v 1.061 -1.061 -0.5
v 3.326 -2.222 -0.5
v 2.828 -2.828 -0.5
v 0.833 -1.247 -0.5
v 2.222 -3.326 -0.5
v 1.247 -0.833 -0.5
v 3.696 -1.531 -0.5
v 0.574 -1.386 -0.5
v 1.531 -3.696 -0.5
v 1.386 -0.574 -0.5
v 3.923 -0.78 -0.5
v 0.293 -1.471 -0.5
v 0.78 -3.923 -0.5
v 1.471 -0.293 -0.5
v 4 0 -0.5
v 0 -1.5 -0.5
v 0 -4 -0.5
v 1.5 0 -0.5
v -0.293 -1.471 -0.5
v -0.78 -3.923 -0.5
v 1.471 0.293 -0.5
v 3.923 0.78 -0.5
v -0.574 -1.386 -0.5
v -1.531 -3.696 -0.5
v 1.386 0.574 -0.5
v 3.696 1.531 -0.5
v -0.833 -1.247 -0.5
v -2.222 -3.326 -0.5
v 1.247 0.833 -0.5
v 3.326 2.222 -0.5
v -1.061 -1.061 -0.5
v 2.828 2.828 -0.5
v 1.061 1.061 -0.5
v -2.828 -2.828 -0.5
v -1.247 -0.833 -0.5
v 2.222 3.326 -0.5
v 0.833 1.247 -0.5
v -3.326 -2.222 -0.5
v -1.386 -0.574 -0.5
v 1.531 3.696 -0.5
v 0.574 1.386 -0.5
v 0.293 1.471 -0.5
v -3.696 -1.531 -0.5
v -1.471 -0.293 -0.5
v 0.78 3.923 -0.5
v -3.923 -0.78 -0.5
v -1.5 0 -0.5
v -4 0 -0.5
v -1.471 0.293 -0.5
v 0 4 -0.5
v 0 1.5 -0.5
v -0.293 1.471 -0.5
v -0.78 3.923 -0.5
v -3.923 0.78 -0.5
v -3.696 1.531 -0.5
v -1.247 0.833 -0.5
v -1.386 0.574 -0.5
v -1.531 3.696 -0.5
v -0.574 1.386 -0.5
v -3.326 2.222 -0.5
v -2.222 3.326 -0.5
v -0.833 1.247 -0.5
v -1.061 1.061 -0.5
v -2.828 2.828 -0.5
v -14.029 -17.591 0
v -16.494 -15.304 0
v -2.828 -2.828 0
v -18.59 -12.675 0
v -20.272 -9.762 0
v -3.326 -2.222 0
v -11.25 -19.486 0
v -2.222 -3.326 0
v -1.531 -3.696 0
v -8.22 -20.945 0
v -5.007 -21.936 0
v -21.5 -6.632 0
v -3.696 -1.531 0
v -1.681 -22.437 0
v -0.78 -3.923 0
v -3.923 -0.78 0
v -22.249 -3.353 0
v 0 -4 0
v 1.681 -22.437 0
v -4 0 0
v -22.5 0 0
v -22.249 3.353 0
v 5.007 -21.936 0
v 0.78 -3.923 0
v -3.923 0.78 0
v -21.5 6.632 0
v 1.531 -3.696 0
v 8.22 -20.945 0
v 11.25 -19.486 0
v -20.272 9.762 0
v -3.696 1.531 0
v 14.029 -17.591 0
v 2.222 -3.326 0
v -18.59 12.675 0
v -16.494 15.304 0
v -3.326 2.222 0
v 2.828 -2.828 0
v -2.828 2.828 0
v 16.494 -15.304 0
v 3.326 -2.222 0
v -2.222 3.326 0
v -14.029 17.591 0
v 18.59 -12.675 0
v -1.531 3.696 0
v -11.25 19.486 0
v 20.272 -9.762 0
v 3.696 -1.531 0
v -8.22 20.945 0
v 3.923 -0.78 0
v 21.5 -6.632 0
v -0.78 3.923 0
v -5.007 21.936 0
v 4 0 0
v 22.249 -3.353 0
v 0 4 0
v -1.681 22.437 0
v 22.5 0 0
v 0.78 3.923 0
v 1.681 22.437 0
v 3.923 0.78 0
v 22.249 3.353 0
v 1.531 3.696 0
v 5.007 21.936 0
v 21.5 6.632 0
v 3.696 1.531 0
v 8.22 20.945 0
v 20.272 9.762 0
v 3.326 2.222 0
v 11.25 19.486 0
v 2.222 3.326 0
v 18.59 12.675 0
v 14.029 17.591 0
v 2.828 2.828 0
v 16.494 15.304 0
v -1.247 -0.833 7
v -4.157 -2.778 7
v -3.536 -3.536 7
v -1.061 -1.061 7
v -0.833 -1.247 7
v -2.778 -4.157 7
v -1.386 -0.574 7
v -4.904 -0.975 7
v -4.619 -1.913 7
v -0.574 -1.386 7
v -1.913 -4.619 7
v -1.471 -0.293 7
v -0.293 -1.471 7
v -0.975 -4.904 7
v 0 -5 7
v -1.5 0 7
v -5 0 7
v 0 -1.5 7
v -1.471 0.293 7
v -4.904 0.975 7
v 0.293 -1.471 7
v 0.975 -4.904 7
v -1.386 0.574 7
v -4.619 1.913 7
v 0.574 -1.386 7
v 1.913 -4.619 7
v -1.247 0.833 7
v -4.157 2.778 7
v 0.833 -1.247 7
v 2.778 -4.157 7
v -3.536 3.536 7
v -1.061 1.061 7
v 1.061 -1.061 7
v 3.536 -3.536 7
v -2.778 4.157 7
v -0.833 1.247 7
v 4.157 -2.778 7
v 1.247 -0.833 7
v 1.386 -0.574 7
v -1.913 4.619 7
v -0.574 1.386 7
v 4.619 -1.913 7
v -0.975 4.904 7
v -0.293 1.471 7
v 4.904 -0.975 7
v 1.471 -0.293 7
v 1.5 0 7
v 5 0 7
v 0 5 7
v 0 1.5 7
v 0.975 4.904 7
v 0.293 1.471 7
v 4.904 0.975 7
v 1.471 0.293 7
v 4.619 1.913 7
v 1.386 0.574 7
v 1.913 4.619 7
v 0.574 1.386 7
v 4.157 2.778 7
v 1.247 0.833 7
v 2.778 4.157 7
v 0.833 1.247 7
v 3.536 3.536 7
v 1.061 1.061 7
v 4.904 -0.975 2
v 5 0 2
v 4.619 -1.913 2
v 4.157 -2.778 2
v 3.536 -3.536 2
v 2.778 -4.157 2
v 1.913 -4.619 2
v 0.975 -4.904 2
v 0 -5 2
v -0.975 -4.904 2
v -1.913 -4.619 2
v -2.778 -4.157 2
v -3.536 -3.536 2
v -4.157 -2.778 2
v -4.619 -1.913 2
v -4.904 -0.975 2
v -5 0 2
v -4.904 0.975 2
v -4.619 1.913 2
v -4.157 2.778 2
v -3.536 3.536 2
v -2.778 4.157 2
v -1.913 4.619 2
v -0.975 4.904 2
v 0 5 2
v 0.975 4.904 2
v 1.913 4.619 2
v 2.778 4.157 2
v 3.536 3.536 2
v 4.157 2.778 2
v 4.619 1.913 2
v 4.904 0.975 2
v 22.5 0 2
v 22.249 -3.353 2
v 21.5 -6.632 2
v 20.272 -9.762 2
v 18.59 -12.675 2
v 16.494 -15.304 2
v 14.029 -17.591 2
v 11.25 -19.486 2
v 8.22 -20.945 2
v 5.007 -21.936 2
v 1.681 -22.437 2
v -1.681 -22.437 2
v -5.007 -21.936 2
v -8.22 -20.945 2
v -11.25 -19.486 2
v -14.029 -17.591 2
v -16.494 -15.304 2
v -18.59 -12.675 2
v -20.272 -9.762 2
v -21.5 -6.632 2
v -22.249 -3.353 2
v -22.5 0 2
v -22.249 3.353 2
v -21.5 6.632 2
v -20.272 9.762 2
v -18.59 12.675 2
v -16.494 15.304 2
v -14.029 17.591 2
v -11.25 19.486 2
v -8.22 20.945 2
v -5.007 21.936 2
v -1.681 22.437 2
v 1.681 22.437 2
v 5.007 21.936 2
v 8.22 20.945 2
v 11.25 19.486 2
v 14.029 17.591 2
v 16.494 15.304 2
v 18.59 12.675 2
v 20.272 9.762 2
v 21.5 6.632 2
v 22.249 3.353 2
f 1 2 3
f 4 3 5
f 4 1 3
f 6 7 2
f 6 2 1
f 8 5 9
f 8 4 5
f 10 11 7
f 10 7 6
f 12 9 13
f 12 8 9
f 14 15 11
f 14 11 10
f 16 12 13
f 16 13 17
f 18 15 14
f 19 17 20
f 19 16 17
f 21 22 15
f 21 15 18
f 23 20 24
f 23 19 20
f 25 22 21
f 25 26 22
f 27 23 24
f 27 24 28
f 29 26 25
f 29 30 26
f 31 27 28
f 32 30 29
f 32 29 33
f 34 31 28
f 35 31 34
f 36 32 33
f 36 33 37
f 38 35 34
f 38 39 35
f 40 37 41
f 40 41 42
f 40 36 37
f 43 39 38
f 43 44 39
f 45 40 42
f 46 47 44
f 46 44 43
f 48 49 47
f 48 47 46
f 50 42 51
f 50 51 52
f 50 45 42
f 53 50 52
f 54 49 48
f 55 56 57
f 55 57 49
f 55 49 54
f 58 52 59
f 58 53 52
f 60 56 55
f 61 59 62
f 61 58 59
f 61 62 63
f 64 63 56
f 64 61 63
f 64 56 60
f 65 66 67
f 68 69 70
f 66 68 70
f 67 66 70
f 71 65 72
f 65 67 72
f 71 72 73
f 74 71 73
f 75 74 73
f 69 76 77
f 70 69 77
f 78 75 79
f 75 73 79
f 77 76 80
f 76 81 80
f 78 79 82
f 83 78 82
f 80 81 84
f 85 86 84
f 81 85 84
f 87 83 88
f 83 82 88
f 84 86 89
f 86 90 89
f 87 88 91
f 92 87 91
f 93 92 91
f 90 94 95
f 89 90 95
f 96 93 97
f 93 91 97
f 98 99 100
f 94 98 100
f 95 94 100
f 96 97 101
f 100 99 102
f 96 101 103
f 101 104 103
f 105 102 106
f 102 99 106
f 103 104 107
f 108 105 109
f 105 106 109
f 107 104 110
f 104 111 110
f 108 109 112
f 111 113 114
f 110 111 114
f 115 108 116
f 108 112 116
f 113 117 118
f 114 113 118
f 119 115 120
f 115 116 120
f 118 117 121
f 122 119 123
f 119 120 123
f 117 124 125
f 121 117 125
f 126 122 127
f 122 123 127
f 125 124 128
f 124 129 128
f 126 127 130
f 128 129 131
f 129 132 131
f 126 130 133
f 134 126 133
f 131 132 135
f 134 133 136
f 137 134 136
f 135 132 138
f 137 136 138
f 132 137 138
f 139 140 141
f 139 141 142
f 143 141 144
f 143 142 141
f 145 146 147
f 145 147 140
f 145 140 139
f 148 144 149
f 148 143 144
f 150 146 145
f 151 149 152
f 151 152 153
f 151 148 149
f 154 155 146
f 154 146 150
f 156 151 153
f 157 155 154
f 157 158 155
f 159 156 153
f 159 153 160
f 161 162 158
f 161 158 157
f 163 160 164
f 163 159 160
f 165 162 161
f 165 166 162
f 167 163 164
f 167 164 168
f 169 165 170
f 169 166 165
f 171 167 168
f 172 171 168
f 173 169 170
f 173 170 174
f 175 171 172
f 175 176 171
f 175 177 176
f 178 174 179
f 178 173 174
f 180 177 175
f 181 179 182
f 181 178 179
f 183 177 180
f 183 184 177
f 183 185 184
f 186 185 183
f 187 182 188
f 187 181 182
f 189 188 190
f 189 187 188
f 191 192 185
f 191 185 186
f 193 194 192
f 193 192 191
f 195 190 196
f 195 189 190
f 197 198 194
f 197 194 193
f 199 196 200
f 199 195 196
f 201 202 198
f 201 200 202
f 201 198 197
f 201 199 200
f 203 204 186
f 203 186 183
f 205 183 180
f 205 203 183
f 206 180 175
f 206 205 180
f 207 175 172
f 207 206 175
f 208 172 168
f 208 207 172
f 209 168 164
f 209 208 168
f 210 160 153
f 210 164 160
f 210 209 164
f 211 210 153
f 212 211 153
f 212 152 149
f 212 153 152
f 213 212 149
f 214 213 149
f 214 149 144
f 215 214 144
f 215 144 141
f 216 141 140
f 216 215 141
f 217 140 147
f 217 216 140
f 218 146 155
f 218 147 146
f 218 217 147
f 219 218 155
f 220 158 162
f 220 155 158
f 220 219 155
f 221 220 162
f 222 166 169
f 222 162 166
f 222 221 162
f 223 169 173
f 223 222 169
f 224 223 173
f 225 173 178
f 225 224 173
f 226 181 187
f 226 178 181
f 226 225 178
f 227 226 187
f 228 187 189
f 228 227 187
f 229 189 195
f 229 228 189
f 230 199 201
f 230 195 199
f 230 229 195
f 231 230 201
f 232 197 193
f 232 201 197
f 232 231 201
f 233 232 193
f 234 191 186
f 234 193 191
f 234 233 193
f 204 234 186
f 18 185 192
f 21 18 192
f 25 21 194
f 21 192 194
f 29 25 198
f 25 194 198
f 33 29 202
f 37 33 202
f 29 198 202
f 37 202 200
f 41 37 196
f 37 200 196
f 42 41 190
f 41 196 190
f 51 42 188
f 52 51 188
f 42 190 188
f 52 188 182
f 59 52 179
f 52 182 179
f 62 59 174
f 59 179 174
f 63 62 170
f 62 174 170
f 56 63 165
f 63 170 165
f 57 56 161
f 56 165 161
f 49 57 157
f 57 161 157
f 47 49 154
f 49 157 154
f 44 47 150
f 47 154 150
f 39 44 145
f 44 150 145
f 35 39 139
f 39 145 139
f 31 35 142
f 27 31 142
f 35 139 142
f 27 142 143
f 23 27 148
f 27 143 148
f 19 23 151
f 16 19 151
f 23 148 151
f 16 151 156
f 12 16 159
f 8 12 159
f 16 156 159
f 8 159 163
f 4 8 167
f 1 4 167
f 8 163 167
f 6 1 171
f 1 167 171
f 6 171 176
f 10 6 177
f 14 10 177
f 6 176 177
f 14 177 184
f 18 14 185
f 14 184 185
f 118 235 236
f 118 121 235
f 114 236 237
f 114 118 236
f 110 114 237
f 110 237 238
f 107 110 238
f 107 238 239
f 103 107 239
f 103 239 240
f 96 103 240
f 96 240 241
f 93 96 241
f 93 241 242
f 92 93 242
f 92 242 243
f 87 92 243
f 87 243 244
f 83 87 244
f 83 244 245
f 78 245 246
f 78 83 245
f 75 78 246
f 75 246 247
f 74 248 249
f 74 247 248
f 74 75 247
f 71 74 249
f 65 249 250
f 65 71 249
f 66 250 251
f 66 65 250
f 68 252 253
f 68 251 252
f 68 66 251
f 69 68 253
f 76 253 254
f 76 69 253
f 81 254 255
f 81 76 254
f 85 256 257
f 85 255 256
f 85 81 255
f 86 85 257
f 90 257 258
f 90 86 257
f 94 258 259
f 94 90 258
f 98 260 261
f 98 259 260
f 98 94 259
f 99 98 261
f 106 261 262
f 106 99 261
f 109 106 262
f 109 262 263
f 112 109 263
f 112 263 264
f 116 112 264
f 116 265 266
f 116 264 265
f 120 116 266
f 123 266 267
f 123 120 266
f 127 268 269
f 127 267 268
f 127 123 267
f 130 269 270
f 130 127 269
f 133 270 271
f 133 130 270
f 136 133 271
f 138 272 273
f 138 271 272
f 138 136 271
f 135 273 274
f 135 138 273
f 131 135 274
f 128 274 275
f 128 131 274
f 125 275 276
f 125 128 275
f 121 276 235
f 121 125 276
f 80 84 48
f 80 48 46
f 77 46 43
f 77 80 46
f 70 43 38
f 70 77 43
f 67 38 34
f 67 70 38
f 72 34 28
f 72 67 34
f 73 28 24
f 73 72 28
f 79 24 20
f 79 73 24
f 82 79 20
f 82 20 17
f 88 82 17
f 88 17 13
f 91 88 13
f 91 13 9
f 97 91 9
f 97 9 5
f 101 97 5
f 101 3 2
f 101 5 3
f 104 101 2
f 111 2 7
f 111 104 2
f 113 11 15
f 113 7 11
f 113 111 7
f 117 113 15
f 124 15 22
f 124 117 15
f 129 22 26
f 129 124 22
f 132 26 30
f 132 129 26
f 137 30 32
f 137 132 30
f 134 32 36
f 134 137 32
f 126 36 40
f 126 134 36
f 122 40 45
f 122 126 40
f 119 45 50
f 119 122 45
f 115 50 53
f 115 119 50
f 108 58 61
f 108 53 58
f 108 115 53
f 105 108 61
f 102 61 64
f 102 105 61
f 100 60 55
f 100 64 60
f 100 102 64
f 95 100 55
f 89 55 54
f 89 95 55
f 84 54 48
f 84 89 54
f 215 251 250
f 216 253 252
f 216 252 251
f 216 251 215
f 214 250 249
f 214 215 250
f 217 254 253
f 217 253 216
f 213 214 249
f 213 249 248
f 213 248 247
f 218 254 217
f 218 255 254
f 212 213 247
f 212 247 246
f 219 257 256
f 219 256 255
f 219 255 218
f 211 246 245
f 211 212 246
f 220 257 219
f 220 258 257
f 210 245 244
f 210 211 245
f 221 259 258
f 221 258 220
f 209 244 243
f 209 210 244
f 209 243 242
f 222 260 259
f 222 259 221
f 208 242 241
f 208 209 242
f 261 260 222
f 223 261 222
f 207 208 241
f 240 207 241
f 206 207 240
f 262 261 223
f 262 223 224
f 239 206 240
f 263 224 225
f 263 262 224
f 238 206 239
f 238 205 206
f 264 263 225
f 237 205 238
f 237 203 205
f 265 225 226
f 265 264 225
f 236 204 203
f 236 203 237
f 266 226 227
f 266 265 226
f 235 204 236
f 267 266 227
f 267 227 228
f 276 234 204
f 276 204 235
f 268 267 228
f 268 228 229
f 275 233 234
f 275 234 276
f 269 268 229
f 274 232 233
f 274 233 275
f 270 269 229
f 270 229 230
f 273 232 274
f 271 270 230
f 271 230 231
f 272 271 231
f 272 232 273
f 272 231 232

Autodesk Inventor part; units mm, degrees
ref_plane "YZ Plane" through (0, 0, 0) normal (1, 0, 0) x (0, 1, 0)
ref_plane "XZ Plane" through (0, 0, 0) normal (0, 1, 0) x (-1, 0, 0)
ref_plane "XY Plane" through (0, 0, 0) normal (0, 0, 1) x (1, 0, 0)
sketch "スケッチ1" plane through (0, 0, 0) normal (0, 0, 1) x (1, 0, 0)
  circle A0 centre (0, 0) radius 22.5
  dimension "d0" = 45
extrude "押し出し1" add sketch "スケッチ1" along normal blind 2
sketch "スケッチ2" plane through (0, 0, 2) normal (0, 0, 1) x (1, 0, 0)
  circle A0 centre (0, 0) radius 5
  dimension "d3" = 10
extrude "押し出し2" add sketch "スケッチ2" along normal blind 5
sketch "スケッチ3" plane through (0, 0, 0) normal (0, 0, -1) x (-1, 0, 0)
  circle A0 centre (0, 0) radius 4
  dimension "d6" = 8
extrude "押し出し3" add sketch "スケッチ3" along normal blind 0.5
sketch "スケッチ4" plane through (0, 0, 7) normal (0, 0, 1) x (1, 0, 0)
  circle A0 centre (0, 0) radius 1.5
  dimension "d9" = 3
extrude "押し出し4" cut sketch "スケッチ4" against normal blind 12
properties part number "Gear2_S50B 90B+0203" material "真鍮"
